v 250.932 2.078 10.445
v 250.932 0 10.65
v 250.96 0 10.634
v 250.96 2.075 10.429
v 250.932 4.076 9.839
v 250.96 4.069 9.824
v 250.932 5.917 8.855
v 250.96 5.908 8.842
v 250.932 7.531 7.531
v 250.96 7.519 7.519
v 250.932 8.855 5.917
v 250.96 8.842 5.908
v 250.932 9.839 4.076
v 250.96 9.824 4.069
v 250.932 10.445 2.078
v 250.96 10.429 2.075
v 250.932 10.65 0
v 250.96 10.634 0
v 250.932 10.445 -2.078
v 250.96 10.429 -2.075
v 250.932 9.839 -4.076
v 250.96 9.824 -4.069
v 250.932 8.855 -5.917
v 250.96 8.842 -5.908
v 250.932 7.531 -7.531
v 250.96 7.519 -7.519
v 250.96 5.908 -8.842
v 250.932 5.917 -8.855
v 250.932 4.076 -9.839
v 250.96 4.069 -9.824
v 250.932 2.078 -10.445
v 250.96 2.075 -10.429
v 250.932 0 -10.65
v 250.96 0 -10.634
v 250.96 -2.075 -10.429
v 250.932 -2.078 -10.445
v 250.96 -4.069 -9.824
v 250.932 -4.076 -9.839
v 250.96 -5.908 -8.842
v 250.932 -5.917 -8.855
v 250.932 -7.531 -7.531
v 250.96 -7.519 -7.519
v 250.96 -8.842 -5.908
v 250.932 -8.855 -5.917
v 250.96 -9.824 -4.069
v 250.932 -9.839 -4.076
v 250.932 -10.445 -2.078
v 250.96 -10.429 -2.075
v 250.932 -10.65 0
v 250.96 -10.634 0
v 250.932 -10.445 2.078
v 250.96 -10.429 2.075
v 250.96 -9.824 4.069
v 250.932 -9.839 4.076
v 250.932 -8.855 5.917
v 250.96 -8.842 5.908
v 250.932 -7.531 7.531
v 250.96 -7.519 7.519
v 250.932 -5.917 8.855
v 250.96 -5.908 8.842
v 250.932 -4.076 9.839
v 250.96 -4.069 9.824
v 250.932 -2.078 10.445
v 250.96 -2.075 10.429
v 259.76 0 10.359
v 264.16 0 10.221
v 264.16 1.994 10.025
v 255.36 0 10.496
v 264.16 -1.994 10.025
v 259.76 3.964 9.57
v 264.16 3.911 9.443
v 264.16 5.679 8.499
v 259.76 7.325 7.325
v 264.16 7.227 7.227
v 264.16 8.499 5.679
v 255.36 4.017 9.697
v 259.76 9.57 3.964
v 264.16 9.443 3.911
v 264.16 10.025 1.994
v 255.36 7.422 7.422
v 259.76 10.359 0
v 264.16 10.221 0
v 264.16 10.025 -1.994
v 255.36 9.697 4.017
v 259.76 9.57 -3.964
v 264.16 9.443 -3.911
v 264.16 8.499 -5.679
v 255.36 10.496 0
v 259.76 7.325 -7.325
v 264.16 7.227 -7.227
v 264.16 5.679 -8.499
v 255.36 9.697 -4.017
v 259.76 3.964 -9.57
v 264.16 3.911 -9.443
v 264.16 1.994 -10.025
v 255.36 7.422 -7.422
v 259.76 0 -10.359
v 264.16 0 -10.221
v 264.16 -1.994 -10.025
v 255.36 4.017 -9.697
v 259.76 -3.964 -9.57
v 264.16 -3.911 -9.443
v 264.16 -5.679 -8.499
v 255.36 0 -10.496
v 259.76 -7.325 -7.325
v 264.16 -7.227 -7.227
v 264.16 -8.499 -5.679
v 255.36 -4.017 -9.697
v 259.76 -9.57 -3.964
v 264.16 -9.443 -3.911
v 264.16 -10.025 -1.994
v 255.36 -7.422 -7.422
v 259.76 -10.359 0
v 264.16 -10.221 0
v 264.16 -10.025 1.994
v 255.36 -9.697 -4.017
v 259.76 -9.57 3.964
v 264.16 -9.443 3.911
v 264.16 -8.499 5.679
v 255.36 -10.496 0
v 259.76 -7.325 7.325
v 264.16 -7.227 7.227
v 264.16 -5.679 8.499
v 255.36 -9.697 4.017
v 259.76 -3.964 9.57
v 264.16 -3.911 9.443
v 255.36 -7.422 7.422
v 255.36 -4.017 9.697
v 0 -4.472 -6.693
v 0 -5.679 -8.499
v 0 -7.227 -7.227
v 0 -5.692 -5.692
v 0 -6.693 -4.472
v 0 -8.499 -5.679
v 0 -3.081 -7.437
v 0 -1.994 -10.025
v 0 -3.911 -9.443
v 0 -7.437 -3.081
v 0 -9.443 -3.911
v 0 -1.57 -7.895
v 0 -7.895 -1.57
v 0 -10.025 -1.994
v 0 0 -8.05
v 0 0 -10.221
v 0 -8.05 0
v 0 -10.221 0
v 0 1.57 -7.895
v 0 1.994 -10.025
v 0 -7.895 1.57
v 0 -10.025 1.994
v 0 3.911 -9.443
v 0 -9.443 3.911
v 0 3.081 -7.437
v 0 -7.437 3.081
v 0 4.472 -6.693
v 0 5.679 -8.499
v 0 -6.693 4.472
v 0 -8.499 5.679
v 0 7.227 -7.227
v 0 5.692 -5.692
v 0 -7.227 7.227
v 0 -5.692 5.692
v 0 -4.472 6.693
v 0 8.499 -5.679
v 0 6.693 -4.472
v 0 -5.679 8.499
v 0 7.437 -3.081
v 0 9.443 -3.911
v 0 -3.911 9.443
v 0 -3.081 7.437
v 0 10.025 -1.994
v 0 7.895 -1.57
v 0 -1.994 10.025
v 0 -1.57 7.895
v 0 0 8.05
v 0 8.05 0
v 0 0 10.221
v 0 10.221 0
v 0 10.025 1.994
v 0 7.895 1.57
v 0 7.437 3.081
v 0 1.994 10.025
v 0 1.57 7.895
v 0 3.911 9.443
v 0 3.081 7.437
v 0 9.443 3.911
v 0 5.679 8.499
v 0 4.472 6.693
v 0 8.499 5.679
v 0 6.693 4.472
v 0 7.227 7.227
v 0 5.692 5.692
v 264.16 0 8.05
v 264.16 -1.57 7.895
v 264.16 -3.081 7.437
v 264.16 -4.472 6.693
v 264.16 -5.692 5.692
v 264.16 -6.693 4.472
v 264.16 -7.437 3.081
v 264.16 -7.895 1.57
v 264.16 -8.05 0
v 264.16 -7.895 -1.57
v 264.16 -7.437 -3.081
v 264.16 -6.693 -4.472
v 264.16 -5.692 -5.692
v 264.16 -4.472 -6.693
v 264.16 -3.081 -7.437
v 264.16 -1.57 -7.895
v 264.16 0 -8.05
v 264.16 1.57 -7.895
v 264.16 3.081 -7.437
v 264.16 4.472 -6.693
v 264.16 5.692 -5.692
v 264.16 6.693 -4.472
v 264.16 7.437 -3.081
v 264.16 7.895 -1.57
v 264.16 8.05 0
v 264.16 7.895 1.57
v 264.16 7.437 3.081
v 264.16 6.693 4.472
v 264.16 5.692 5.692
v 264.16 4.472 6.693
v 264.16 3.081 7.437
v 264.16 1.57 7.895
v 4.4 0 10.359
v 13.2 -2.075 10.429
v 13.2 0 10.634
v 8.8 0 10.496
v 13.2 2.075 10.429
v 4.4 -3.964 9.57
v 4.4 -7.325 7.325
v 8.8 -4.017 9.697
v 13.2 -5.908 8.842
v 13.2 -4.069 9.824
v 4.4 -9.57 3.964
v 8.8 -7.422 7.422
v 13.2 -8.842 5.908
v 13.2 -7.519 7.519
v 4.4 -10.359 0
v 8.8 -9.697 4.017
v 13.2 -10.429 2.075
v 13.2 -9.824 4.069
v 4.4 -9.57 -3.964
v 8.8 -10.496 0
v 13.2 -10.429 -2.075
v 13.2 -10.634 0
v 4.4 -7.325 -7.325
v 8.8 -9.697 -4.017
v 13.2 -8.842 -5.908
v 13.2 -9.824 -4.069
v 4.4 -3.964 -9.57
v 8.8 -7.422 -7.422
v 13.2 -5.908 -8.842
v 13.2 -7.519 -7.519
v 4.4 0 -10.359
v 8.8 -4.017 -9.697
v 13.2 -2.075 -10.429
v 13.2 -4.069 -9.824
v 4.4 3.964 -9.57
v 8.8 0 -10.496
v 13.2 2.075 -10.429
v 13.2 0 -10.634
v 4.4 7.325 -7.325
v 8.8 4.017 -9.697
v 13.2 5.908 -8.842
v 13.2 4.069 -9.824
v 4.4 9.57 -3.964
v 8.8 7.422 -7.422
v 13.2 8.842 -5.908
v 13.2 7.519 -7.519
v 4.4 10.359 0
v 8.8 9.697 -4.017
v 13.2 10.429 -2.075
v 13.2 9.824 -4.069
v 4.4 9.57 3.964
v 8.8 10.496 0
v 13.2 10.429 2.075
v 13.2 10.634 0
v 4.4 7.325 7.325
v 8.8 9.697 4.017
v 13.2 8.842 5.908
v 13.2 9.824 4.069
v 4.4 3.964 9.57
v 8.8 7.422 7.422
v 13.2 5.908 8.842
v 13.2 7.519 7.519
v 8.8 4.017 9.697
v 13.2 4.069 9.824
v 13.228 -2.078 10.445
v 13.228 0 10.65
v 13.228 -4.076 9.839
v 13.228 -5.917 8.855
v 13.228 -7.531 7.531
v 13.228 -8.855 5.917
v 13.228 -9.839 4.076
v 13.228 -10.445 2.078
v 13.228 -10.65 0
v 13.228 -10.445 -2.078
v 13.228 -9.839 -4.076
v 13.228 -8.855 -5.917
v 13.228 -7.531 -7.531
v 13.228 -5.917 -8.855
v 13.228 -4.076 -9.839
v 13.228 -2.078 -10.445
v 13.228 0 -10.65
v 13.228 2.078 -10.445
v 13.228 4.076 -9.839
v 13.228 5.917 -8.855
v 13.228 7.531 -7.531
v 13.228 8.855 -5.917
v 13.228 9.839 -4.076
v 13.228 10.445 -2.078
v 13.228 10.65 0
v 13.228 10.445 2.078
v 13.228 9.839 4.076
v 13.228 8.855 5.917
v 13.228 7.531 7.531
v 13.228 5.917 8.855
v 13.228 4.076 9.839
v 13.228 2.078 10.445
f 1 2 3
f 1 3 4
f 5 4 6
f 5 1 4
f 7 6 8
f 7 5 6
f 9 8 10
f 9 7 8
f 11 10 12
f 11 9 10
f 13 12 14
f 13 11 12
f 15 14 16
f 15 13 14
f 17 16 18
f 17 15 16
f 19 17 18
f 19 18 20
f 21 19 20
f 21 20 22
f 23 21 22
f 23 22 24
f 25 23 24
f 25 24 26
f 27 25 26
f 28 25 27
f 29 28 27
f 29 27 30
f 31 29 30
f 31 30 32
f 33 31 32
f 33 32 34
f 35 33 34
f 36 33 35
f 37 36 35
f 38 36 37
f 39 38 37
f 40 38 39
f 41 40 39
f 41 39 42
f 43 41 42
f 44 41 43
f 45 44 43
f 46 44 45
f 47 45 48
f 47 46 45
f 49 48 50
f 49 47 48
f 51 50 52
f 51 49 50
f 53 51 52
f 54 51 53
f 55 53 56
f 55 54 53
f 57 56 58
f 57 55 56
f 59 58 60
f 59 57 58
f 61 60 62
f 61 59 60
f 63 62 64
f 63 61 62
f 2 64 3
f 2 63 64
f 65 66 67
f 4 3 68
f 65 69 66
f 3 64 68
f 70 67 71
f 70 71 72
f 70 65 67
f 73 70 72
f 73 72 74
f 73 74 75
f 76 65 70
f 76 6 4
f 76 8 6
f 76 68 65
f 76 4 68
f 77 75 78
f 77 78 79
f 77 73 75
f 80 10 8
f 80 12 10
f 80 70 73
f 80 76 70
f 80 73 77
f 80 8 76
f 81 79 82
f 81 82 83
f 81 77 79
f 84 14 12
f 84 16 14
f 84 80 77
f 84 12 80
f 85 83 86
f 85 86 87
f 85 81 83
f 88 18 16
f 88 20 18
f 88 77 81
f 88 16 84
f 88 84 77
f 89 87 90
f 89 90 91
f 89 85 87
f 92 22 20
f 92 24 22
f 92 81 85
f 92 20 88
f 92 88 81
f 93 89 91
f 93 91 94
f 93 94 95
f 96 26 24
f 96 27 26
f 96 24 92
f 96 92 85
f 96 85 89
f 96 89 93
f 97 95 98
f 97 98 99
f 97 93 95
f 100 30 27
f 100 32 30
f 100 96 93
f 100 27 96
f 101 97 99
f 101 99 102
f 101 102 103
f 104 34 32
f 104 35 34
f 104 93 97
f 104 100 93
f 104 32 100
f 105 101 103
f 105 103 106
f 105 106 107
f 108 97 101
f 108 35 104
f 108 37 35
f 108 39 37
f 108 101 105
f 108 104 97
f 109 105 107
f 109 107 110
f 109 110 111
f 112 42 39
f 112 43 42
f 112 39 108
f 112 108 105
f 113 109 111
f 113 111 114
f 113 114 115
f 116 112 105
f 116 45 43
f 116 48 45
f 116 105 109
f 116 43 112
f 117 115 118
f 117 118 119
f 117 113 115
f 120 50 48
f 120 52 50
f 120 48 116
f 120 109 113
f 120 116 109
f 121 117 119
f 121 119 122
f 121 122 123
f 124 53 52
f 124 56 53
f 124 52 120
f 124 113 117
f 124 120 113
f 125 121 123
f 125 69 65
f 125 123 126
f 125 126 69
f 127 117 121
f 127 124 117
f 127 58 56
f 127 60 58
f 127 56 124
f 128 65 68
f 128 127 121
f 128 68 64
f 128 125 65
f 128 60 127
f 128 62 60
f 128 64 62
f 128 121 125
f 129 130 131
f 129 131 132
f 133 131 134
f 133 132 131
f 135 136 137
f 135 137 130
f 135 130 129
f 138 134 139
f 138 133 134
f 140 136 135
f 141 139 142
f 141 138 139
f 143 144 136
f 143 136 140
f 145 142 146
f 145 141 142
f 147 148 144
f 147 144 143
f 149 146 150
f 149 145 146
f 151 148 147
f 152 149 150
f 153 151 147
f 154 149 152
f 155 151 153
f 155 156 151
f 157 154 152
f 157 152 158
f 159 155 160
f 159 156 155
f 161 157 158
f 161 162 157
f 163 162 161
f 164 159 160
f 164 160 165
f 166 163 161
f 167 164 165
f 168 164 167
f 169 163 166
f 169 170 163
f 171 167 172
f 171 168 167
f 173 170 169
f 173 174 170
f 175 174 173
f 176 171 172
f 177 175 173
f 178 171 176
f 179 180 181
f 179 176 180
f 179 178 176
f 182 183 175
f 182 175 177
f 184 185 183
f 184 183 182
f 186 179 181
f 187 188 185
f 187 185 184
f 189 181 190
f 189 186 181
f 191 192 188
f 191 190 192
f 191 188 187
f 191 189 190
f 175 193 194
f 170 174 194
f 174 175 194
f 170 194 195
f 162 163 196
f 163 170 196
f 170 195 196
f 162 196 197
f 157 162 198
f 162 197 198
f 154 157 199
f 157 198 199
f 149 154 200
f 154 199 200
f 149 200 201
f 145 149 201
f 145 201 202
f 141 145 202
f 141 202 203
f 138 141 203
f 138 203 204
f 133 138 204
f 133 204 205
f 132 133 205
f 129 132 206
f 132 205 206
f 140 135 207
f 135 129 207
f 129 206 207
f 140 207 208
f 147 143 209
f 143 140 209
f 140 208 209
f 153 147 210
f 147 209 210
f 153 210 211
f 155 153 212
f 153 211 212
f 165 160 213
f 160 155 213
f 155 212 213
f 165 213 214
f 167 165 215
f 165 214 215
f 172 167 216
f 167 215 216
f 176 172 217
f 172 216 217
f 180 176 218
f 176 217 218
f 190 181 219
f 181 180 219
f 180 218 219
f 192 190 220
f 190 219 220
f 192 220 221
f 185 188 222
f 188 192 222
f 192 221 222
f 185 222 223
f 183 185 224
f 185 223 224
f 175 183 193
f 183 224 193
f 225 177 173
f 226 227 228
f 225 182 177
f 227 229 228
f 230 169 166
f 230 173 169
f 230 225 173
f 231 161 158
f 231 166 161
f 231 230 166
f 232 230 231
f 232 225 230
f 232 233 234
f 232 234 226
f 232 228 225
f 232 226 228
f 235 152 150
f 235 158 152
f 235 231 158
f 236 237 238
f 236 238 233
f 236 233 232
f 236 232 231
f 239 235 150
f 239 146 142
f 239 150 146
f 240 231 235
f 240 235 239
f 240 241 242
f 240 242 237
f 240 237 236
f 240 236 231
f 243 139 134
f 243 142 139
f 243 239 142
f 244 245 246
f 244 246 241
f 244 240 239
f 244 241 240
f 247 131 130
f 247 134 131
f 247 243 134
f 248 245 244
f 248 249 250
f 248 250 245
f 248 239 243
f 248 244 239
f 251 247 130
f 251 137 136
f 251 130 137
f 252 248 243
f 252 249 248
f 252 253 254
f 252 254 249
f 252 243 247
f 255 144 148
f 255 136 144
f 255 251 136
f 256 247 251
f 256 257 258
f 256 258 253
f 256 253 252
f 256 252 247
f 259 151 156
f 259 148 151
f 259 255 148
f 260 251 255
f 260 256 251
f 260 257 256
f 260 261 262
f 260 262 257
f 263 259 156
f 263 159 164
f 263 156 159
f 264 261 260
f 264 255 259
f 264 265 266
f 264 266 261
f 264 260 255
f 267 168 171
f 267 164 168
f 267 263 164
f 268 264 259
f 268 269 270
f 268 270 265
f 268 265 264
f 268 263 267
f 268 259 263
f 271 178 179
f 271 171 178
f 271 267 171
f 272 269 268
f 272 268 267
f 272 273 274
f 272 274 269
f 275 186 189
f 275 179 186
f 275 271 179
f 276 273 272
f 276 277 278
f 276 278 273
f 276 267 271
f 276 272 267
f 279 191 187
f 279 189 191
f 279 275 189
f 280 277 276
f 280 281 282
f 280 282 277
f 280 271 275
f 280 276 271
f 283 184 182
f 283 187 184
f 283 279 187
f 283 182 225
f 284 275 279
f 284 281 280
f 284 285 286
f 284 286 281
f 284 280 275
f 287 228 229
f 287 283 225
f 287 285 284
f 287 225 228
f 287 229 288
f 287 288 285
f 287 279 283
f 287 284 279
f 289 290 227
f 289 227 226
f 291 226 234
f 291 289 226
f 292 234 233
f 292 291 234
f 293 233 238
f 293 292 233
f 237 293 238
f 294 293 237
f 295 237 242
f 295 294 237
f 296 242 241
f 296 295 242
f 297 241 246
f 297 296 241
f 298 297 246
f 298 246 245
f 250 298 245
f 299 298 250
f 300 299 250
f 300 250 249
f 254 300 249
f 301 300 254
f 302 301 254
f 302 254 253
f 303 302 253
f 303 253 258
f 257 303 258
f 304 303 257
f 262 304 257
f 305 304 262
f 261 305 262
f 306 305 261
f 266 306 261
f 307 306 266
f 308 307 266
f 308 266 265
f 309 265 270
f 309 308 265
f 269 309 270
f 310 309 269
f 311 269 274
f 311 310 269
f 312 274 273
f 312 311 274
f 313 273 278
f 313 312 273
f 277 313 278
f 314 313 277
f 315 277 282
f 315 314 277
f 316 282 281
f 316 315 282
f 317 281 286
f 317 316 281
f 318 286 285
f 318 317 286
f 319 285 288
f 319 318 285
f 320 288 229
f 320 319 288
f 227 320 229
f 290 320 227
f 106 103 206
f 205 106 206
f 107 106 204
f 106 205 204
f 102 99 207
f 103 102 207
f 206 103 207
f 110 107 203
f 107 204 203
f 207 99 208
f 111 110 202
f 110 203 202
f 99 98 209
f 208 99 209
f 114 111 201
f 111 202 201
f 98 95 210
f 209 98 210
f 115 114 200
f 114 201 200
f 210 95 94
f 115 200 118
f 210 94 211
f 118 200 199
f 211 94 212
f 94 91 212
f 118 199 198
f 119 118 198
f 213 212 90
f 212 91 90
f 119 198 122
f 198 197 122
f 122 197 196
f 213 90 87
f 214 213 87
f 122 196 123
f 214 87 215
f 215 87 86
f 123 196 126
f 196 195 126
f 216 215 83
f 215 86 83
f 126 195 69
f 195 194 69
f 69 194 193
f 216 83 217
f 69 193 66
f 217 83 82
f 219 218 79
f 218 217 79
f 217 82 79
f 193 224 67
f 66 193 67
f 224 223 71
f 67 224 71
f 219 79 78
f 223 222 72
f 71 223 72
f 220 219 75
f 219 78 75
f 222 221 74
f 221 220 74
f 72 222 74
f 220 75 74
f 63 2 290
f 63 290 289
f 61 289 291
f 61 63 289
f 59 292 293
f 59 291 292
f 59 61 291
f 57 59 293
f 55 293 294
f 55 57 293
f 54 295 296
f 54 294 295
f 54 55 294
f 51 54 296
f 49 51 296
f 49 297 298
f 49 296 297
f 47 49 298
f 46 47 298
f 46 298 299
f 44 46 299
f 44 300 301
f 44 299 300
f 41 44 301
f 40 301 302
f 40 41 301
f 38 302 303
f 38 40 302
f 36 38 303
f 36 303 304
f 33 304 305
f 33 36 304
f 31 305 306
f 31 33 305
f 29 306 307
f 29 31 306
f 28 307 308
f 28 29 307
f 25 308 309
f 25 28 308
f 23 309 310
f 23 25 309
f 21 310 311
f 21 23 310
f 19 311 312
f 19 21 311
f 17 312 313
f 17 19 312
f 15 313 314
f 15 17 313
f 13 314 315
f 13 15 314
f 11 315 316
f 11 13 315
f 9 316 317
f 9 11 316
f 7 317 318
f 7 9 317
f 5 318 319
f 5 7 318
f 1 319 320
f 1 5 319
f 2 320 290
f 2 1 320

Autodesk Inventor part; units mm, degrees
ref_plane "YZ Plane" through (0, 0, 0) normal (1, 0, 0) x (0, 1, 0)
ref_plane "XZ Plane" through (0, 0, 0) normal (0, 1, 0) x (-1, 0, 0)
ref_plane "XY Plane" through (0, 0, 0) normal (0, 0, 1) x (1, 0, 0)
sketch "Sketch1" plane through (0, 0, 0) normal (0, 1, 0) x (-1, 0, 0)
  line L0 (-264.16, 0) -> (0, 0)
  line L1 (0, 0) -> (0, 8.05) construction
  line L2 (0, 8.05) -> (0, 10.2212)
  line L3 (0, 10.2212) -> (-13.2, 10.6337)
  line L4 (-13.2, 10.6337) -> (-13.2281, 10.65)
  line L5 (-13.2281, 10.65) -> (-250.9319, 10.65)
  line L6 (0, 8.05) -> (-264.16, 8.05)
  line L7 (-132.08, 0) -> (-132.08, 10.65) construction
  line L8 (-264.16, 0) -> (-264.16, 8.05) construction
  line L9 (-264.16, 8.05) -> (-264.16, 10.2212)
  line L10 (-264.16, 10.2212) -> (-250.96, 10.6337)
  line L11 (-250.96, 10.6337) -> (-250.9319, 10.65)
  line L12 (-8.2, 10.4775) -> (-8.2, 0) construction
  line L13 (-13.2, 10.6337) -> (-13.2, 0) construction
  line L14 (-250.96, 10.6337) -> (-250.96, 0) construction
  dimension "d0" = 8.2
  dimension "d1" = 13.2
  dimension "d2" = 1.79
  dimension "d3" = 20.955
  dimension "d4" = 21.3
  dimension "d5" = 2.6
  dimension "d6" = 264.16
  dimension "d7" = 30
revolve "Revolution1" add sketch "Sketch1" angle 360 about axis through (264.16, 0, 0) along (-1, 0, 0)
thread "Thread1" size "R 1/2" standard "ISO Taper" full length
thread "Thread2" size "R 1/2" standard "ISO Taper" full length
equation "\"d0\" = a"
equation "\"d1\" = LT"
equation "\"d3\" = MjD"
equation "\"d4\" = OD"
equation "\"d5\" = T"
equation "\"d6\" = L"
equation "\"OD\" = 21.3"
equation "\"T\" = 2.6"
equation "\"L\" = PL"
equation "\"LT\" = 13.2"
equation "\"ID\" = 16.1"
equation "\"PL\" = 264.16"
equation "\"MjD\" = 20.955"
equation "\"a\" = 8.2"
equation "\"Size_Designation\" = 1.2345"
equation "\"PLmin\" = 2 * LT + T"
properties material "Stainless Steel"
